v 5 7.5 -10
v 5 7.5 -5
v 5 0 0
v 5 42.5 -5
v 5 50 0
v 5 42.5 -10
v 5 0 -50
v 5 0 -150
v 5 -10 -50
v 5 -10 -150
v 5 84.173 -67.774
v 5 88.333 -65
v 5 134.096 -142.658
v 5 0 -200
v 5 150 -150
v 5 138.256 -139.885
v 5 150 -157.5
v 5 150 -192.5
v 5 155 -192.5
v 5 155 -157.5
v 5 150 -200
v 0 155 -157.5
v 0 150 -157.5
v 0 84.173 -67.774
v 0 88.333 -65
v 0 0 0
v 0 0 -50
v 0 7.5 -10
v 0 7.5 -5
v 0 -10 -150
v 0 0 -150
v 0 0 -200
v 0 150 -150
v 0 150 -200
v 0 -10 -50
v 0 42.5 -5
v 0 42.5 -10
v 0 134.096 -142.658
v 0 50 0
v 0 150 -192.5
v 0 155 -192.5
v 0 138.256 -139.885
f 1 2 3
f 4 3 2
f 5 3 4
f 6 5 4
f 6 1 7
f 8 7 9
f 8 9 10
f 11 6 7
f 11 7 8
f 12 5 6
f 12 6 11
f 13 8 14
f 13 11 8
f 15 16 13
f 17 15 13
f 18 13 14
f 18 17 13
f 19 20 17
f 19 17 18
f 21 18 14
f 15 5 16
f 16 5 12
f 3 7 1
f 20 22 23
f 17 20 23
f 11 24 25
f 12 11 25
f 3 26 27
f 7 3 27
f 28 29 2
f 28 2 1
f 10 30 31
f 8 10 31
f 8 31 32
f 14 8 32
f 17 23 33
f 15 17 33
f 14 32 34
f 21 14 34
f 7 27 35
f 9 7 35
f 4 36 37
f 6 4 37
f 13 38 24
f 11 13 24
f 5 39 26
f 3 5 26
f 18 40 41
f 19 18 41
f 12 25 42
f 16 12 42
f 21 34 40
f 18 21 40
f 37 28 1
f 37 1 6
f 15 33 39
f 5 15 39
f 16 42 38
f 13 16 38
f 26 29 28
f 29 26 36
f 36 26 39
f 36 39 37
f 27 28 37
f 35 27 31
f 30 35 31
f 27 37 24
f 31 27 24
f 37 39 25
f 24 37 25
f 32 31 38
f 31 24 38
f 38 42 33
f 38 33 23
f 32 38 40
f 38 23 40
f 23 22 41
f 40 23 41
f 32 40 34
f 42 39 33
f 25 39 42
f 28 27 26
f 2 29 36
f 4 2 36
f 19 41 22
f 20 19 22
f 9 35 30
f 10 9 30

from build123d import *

# Parameters (mm, degrees)
CROQUIS1_W              = 5
CROQUIS1_H              = 35
SALIENTE_EXTRUIR1_DEPTH = 5


with BuildPart() as part:
    # Croquis1 → Saliente-Extruir1 (new body)
    with BuildSketch(Plane(origin=(0, 0, 0), x_dir=(0, 0, -1), z_dir=(1, 0, 0))):
        Polygon((150, 150), (0, 50), (0, 0), (50, 0), (50, -10), (150, -10), (150, 0), (200, 0), (200, 150), (192.5, 150), (192.5, 155), (157.5, 155), (157.5, 150), align=None)
        with Locations((7.5, 25)):
            Rectangle(CROQUIS1_W, CROQUIS1_H, mode=Mode.SUBTRACT)
        Polygon((65, 88.333333333), (139.88452649, 138.256350994), (142.658027472, 134.096099522), (67.773500981, 84.173081862), align=None, mode=Mode.SUBTRACT)
    extrude(amount=SALIENTE_EXTRUIR1_DEPTH)


solid = part.part
